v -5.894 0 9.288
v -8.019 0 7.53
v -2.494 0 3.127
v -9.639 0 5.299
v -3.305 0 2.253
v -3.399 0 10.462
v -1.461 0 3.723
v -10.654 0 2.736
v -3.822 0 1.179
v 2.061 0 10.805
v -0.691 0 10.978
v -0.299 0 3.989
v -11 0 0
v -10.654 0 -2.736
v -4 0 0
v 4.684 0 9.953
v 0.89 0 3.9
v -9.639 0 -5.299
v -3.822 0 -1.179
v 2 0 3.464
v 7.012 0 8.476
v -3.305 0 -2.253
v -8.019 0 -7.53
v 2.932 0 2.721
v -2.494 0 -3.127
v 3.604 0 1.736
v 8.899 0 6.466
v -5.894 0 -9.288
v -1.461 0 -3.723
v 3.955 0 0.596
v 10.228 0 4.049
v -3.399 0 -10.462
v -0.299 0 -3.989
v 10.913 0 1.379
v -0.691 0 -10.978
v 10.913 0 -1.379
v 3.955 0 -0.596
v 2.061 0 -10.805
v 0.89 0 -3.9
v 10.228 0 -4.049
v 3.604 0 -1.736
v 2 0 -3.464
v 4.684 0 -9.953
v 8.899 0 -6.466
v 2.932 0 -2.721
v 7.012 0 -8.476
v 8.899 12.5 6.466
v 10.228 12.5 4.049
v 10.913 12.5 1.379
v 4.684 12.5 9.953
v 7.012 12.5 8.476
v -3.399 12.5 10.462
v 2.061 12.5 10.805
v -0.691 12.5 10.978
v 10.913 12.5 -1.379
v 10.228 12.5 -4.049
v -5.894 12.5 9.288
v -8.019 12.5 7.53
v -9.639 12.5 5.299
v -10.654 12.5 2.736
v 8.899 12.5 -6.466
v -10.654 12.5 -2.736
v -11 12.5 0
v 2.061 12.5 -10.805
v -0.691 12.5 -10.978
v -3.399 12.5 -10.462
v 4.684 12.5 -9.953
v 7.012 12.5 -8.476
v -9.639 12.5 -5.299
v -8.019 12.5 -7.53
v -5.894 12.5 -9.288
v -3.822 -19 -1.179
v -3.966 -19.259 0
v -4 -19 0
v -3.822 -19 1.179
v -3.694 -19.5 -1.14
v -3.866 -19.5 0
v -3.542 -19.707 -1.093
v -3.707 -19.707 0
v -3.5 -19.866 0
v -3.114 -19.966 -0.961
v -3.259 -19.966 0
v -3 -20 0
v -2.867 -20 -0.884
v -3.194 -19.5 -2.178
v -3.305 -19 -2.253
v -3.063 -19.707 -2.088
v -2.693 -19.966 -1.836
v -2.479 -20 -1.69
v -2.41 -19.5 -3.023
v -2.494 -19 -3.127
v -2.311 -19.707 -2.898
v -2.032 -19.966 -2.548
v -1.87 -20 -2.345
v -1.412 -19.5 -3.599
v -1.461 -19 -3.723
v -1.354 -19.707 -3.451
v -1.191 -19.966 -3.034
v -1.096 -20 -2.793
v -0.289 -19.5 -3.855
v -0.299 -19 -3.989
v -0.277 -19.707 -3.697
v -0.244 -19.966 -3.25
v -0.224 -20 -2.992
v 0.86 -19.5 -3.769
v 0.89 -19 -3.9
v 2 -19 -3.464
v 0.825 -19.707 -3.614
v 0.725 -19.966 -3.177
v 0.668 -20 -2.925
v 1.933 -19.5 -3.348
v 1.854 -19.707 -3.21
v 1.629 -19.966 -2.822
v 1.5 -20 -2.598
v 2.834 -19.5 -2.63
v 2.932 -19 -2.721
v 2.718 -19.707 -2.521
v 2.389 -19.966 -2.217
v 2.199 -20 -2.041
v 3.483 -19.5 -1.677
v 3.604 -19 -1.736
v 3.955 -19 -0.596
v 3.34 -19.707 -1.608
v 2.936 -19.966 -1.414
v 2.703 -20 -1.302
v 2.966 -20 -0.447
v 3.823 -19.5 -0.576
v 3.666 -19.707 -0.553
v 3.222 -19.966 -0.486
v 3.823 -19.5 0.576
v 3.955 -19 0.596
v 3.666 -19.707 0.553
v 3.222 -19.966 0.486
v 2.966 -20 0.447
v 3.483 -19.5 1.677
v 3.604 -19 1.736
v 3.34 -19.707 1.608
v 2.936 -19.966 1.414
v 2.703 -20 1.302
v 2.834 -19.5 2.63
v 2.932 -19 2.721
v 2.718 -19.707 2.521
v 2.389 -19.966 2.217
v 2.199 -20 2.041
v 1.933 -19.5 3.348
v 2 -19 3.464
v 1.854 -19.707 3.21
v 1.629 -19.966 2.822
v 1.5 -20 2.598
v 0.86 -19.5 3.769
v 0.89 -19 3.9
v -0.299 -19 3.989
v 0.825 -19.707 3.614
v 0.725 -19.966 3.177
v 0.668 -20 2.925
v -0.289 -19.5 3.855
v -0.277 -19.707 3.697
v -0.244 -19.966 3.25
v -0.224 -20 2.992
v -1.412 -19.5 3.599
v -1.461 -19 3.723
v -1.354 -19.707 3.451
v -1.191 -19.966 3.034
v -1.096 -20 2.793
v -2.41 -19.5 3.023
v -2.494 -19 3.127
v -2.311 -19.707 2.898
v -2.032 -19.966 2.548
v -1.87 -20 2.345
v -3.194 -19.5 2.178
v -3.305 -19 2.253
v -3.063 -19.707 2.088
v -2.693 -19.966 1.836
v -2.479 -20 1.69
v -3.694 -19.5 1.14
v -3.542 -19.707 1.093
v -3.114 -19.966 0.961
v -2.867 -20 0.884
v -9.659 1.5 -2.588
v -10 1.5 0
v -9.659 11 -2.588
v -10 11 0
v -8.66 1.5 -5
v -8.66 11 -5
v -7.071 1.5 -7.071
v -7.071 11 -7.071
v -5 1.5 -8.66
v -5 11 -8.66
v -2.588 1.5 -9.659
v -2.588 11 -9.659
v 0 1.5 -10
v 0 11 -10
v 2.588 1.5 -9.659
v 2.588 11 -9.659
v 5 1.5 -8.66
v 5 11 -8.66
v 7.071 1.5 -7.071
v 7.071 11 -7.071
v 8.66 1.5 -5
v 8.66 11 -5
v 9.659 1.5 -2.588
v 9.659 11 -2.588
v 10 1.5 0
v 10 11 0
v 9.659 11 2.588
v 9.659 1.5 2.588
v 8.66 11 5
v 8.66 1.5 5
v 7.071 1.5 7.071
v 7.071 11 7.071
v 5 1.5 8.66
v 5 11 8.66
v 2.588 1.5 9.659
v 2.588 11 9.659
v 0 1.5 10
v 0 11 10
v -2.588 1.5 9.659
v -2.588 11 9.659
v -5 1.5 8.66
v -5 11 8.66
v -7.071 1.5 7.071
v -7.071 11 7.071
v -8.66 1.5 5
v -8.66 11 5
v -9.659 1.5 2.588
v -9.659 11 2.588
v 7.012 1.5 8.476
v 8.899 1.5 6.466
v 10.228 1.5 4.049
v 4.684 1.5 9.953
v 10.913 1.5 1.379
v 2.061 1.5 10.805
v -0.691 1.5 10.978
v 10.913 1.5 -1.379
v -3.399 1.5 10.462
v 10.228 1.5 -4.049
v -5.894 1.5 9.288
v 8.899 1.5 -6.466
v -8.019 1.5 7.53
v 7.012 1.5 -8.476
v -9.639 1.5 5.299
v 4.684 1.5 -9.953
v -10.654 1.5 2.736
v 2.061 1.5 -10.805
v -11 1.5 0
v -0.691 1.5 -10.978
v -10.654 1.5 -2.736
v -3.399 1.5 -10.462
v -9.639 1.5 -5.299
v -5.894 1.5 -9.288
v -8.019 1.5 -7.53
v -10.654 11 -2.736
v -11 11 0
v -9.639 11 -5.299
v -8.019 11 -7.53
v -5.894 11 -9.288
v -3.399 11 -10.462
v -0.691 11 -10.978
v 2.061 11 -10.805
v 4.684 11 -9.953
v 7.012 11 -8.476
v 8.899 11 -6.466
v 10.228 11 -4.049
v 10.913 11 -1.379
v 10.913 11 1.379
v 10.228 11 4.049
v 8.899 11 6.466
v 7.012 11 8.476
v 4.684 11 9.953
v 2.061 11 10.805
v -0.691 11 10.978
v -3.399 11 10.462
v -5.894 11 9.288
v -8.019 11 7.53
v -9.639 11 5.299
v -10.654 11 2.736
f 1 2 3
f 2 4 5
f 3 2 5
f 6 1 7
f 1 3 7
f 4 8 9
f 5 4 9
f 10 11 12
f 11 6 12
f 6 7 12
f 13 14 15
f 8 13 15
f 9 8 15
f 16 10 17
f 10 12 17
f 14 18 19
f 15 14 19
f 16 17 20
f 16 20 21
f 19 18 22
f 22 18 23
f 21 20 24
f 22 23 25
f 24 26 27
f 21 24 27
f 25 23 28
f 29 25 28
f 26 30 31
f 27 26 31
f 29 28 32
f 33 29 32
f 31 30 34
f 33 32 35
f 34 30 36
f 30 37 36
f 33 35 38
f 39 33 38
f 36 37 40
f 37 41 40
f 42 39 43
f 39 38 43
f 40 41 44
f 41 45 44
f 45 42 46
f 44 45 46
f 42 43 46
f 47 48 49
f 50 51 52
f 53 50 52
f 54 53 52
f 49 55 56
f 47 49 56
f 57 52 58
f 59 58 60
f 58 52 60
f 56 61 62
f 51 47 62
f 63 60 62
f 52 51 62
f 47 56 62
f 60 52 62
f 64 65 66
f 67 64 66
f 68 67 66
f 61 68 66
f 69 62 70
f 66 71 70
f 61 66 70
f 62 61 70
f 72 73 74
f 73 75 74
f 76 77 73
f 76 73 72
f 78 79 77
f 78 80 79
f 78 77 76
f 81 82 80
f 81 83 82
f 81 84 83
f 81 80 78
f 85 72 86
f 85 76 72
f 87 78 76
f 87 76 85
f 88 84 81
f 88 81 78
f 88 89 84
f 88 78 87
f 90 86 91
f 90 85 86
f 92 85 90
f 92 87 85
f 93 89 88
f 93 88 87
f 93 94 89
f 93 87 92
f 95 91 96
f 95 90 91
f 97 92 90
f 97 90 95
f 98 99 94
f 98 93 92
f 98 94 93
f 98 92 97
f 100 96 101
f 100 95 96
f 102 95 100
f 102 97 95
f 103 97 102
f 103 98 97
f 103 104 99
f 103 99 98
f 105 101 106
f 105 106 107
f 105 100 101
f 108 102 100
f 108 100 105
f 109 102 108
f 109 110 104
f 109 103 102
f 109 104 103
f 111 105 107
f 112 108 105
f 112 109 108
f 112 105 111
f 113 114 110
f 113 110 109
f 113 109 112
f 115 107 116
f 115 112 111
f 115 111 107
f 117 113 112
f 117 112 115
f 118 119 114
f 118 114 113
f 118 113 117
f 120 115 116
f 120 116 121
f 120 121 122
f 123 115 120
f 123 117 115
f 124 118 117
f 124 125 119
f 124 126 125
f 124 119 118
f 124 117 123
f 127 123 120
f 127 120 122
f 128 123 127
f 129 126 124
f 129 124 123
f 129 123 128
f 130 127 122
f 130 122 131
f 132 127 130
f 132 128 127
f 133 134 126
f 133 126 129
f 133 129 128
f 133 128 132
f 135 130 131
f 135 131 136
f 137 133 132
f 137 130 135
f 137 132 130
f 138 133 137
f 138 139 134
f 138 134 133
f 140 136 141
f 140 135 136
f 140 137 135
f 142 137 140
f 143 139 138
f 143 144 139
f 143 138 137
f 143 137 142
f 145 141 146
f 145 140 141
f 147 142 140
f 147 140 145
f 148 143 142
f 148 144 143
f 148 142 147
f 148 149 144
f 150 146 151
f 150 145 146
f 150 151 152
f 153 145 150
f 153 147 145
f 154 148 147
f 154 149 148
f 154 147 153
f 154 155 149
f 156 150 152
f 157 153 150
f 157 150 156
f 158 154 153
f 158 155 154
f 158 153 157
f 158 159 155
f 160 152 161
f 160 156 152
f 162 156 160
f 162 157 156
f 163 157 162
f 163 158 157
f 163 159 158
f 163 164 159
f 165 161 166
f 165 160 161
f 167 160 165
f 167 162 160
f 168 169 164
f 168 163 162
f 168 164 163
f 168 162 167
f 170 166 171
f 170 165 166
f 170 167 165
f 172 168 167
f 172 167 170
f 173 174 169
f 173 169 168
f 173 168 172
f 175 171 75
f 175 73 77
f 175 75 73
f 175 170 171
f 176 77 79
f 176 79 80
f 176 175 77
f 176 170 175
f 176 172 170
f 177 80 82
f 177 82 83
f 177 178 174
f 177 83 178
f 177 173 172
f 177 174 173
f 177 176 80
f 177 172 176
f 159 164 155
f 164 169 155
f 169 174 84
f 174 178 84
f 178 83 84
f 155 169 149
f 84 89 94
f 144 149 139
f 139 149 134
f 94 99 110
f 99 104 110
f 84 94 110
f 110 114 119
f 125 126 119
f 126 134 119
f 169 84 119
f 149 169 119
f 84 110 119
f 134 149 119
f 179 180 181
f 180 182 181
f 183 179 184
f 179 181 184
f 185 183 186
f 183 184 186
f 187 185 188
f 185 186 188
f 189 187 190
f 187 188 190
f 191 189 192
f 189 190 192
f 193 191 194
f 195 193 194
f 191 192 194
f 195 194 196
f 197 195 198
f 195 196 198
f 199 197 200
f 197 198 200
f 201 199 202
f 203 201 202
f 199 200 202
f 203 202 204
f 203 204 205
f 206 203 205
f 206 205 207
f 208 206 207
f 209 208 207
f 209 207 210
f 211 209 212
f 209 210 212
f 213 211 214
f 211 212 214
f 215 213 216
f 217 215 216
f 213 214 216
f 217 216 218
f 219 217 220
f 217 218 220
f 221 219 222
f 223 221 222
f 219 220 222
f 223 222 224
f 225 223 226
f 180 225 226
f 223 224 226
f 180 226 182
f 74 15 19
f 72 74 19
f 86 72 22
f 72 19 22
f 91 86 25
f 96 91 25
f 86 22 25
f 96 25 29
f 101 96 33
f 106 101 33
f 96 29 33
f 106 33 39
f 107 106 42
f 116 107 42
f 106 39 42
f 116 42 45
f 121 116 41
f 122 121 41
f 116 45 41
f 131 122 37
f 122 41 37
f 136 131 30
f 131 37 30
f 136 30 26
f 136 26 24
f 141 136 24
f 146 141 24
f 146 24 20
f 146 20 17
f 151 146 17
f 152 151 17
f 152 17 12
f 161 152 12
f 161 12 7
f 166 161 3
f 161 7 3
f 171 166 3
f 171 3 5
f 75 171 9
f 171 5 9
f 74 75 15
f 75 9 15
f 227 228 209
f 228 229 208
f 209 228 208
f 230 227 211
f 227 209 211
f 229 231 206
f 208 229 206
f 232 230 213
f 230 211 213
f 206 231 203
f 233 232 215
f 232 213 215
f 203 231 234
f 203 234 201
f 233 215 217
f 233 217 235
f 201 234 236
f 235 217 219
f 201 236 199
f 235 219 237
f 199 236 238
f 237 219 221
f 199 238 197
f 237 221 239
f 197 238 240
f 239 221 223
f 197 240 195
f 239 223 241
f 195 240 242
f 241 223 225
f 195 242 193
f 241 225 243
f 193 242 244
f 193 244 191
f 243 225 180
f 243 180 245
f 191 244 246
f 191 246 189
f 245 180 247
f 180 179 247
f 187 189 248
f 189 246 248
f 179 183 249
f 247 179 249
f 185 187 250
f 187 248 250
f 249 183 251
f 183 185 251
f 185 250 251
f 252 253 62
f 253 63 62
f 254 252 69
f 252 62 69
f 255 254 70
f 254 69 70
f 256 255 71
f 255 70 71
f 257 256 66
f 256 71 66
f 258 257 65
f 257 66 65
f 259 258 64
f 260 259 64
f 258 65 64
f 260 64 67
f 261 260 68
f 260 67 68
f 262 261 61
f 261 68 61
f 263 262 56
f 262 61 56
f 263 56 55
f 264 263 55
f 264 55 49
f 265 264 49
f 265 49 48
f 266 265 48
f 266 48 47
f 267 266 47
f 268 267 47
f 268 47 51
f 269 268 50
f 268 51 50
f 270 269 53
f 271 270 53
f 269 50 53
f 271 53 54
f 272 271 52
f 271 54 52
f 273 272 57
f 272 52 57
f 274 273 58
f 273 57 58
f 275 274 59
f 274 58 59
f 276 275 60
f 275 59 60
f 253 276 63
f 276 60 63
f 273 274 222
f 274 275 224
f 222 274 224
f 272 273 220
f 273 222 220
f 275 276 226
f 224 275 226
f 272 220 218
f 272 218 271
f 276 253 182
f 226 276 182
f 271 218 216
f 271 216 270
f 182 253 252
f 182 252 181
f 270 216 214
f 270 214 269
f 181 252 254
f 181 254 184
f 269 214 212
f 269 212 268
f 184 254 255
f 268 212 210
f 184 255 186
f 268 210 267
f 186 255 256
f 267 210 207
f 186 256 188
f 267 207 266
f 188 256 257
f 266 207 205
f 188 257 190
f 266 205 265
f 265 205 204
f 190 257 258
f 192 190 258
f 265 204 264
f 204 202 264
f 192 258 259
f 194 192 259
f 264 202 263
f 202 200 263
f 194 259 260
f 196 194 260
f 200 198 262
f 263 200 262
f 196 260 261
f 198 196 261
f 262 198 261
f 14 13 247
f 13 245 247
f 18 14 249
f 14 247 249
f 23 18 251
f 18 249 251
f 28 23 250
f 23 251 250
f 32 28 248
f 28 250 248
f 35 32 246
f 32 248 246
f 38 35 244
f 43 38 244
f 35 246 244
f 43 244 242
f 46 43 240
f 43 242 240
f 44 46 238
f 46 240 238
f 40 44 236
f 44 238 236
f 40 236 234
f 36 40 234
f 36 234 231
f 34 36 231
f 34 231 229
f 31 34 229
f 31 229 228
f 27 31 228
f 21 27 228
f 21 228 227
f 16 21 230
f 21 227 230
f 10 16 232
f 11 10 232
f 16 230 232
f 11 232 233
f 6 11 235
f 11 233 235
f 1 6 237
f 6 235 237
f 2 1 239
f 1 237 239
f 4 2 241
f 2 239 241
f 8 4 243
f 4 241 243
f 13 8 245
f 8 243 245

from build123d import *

# Parameters (mm, degrees)
FILLET1_R = 1


with BuildPart() as part:
    # Sketch1 → Revolve1 (revolve)
    with BuildSketch(Plane.XY):
        Polygon((-4, -20), (-4, 0), (-11, 0), (-11, 1.5), (-10, 1.5), (-10, 11), (-11, 11), (-11, 12.5), (0, 12.5), (0, -20), align=None)
    revolve(axis=Axis((0, 12.5, 0), (0, -1, 0)))

    # Fillet1
    fillet1_edges = [part.edges().sort_by_distance(p)[0] for p in [
        (4, -20, 0),
    ]]
    fillet(fillet1_edges, radius=FILLET1_R)


solid = part.part
